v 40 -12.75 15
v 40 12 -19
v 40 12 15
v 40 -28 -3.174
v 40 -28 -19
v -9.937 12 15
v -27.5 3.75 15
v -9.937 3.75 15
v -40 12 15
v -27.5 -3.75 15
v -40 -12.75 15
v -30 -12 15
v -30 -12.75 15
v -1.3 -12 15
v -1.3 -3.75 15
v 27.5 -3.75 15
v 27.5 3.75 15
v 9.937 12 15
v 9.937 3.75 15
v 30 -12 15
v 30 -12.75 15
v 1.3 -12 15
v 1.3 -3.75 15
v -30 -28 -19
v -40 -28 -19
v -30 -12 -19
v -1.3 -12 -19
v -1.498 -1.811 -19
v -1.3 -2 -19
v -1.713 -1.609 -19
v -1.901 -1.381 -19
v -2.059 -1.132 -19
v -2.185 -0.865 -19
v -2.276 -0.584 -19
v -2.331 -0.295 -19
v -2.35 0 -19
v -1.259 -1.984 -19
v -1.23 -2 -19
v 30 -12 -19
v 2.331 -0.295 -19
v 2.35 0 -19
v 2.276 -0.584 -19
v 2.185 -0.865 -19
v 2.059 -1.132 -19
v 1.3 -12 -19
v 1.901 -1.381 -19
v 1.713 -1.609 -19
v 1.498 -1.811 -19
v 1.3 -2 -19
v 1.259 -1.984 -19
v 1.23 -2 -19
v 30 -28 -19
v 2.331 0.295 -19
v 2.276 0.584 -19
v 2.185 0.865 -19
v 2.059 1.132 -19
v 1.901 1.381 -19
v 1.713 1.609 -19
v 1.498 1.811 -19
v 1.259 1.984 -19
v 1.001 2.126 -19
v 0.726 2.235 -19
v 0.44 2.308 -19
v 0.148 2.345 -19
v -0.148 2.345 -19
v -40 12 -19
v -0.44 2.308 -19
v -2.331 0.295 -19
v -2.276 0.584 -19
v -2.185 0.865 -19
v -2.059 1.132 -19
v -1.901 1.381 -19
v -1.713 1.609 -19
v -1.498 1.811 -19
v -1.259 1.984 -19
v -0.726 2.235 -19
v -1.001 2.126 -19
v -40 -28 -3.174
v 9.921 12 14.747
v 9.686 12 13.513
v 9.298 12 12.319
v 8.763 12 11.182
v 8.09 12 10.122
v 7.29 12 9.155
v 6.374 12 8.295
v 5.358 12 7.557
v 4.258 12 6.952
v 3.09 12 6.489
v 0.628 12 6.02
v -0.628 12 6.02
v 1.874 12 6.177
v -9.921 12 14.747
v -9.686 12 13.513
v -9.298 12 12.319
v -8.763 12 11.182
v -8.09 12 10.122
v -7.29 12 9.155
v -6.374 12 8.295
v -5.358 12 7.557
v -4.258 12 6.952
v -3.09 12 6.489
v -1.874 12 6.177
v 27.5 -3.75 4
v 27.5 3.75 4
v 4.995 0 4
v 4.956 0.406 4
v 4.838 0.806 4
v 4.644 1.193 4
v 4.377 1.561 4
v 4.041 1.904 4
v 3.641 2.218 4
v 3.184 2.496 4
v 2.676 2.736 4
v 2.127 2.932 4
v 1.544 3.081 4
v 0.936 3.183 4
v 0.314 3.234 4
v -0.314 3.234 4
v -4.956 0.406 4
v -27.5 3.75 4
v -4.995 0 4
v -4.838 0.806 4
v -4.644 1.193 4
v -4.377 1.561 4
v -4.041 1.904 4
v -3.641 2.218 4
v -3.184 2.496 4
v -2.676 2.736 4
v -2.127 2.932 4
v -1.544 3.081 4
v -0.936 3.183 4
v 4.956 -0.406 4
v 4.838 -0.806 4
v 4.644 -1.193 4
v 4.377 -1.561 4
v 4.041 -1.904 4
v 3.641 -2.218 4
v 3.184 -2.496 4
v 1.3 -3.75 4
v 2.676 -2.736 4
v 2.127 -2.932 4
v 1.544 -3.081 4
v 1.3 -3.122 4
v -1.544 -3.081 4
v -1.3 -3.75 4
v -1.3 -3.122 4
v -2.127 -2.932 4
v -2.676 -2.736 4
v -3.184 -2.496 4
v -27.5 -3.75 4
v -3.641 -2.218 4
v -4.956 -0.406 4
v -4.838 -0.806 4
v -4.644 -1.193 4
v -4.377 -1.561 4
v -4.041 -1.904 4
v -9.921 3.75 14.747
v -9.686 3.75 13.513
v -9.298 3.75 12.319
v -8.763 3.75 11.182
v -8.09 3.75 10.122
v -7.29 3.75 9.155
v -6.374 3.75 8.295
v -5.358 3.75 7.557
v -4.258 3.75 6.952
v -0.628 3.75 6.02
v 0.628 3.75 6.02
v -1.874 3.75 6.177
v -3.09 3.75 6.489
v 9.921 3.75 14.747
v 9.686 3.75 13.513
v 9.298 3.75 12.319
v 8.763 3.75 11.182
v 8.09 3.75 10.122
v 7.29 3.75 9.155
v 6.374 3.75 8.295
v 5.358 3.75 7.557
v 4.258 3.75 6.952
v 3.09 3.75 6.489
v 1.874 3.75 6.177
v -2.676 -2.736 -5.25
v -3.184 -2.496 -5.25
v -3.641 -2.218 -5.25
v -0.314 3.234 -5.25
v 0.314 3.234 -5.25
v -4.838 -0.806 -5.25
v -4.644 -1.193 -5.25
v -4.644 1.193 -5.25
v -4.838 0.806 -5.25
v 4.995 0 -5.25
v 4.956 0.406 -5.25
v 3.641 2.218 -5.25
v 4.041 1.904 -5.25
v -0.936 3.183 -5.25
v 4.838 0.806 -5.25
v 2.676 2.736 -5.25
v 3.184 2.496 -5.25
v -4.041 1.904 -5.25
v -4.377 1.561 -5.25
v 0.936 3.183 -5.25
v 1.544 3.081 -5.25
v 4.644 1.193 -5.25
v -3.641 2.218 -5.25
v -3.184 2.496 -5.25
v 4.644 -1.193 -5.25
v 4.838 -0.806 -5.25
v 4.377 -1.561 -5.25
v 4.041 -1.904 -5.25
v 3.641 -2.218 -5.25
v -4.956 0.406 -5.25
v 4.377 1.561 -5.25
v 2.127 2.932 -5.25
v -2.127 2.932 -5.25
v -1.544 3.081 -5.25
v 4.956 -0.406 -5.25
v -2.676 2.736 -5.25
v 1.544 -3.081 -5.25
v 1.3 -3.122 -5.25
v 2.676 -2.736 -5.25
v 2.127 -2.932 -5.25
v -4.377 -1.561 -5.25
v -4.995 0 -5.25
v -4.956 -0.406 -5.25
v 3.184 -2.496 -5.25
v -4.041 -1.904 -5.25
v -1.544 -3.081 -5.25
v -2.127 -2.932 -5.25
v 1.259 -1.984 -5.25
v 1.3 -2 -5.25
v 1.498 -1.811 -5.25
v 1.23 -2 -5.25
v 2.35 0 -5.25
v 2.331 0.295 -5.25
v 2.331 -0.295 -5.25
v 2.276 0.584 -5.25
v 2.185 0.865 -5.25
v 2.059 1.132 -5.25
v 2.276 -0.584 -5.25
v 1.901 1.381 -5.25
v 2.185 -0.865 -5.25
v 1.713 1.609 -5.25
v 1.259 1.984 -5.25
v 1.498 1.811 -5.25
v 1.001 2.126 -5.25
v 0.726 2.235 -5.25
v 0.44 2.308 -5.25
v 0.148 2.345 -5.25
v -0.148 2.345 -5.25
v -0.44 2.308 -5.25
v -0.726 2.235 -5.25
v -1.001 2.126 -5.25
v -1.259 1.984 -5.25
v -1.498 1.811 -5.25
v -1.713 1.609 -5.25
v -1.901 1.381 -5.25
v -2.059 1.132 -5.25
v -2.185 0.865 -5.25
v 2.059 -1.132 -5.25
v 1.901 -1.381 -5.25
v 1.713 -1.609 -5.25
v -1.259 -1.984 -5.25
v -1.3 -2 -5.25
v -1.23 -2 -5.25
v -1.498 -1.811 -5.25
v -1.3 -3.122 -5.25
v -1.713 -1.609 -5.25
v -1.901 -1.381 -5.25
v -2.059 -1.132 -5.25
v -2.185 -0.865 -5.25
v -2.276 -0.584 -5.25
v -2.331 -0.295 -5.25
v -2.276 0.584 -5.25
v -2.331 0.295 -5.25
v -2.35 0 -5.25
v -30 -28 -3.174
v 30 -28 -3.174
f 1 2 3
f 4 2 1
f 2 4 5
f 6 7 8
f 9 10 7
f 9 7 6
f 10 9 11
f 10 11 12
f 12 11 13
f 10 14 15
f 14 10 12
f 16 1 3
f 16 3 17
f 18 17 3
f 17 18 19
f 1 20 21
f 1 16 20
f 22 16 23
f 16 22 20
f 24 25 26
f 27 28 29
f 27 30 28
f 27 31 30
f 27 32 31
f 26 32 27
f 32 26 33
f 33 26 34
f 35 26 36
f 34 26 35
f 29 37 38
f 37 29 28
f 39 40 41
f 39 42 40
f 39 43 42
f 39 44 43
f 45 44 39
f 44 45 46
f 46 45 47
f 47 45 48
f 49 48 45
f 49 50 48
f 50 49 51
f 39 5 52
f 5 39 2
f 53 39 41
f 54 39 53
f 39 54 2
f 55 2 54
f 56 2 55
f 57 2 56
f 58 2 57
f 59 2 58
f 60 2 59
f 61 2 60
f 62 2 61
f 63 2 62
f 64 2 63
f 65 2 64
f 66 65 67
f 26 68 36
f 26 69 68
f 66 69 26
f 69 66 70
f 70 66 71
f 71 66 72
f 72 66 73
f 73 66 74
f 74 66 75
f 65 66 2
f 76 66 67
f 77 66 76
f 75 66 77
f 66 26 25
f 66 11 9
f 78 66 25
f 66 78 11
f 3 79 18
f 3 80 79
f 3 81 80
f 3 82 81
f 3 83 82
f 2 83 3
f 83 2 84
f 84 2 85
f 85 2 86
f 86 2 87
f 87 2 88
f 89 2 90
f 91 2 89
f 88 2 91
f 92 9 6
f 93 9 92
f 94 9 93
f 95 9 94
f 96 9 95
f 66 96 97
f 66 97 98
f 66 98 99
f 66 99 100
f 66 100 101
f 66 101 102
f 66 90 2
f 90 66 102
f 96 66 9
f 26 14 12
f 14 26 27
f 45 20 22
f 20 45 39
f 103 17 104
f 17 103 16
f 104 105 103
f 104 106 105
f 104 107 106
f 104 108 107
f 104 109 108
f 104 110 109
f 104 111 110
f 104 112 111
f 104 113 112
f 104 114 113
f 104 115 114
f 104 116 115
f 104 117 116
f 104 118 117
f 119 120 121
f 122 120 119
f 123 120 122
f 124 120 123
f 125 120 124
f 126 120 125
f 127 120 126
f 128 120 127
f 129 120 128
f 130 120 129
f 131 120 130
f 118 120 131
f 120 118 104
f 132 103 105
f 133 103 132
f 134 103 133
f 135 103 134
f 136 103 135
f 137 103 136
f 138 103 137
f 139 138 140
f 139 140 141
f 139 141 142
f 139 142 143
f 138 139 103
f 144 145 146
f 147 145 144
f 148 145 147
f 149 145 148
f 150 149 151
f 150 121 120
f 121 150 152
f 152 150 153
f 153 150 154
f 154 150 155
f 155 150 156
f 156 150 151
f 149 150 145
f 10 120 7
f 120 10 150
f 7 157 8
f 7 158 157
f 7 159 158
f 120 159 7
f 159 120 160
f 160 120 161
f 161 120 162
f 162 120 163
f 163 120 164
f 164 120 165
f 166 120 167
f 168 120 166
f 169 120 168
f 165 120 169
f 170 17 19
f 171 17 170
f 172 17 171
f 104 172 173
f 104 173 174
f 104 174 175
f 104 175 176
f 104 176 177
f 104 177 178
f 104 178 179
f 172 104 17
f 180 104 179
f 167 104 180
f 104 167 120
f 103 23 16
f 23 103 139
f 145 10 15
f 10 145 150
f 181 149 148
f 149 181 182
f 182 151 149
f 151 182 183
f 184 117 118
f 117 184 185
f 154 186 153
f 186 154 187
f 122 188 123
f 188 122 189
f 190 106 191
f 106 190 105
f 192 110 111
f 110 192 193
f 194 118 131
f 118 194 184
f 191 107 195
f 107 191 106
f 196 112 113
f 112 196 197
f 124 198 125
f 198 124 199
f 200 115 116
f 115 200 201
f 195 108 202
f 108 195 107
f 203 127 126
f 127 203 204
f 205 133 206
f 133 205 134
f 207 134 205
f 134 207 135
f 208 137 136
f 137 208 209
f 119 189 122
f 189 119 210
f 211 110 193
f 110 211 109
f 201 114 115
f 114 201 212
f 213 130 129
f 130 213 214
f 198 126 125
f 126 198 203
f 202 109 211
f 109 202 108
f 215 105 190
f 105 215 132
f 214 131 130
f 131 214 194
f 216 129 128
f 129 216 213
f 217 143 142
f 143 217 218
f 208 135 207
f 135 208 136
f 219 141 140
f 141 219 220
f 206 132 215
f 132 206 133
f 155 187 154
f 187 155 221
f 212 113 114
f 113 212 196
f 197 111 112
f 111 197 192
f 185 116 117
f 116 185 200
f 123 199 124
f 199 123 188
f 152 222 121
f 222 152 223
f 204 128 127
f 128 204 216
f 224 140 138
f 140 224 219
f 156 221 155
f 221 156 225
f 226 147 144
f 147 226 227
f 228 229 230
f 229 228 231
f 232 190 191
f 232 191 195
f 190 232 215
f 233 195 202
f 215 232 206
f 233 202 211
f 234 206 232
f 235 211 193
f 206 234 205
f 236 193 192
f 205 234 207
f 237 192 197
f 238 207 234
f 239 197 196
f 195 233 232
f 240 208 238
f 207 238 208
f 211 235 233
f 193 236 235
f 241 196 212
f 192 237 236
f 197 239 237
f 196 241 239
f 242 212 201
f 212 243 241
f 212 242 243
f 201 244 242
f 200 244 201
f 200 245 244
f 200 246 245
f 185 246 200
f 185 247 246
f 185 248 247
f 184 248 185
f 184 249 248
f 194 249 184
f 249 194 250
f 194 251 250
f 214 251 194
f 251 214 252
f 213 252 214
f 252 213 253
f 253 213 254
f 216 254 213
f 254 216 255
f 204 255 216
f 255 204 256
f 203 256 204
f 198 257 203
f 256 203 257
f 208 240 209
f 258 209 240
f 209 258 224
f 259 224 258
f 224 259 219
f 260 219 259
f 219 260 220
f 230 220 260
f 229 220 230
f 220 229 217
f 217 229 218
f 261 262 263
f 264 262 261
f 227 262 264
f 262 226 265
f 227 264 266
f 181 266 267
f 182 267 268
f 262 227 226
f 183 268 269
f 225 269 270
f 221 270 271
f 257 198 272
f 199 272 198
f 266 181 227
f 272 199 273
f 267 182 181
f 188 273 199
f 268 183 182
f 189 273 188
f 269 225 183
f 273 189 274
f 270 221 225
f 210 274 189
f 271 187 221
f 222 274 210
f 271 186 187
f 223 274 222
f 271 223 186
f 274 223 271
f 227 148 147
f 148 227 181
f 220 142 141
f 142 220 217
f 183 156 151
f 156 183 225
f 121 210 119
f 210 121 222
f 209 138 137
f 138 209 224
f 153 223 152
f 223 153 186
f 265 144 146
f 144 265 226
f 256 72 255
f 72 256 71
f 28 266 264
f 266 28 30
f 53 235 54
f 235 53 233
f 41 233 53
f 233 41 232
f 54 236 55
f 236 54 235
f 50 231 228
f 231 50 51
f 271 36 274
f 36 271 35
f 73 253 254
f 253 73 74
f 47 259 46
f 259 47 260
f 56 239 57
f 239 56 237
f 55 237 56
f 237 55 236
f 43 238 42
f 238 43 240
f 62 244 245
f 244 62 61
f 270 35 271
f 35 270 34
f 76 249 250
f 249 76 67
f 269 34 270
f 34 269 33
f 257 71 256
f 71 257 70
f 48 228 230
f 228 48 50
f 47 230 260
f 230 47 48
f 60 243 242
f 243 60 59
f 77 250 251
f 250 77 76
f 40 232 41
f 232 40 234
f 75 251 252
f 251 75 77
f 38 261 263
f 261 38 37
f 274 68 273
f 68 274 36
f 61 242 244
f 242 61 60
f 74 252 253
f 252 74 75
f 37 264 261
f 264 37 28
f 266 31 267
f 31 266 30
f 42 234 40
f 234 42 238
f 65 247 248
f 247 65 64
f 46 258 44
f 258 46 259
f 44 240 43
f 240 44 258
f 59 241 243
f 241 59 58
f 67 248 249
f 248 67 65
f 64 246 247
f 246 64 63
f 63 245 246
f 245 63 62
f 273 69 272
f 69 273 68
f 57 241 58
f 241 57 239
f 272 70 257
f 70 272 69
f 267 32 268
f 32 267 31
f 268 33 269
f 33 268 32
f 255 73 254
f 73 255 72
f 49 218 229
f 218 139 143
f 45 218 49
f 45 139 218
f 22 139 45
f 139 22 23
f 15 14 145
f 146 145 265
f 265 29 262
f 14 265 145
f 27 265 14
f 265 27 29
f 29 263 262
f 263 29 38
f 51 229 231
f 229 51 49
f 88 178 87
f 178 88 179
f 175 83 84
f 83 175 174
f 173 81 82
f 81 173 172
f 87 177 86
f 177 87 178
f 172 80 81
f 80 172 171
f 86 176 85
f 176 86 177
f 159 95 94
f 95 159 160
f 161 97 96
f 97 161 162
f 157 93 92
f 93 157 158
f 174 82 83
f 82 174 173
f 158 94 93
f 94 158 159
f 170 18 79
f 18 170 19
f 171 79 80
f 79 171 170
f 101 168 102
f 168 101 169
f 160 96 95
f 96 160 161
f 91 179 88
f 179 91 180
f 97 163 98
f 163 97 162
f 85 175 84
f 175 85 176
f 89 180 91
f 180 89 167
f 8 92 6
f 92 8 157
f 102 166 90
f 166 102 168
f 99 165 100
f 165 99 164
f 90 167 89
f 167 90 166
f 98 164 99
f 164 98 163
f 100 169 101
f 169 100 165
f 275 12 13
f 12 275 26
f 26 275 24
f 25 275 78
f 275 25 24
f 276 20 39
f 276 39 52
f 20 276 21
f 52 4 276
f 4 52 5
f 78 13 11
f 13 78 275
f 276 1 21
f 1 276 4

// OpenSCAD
difference(){
	translate([0,0,-2]) cube(size = [80,24,34], center = true);
	translate([0,0,20]) color("green") cube(size = [55,7.5,32], center = true);
	scale([1.85,1.2,1])  cylinder(h = 10.5, r=2.7,$fn=50, center=true);	
	translate([0,0,-6]) cylinder(h = 26, r=2.35,$fn=50, center=true);	
	translate([0,-7.5,-2]) color("blue") cube(size = [2.6,11,35], center=true);
	translate([0,8,16]) rotate([90,0,0]) cylinder(h = 8.6, r=10,$fn=50, center=true);	

}

difference(){
	union(){
		translate([-35,-20,-2]) cube(size = [10,16,34], center = true);	
		translate([35,-20,-2]) cube(size = [10,16,34], center = true);
	}
	translate([0,-30,10]) rotate([50,0,0]) cube(size = [81,45,20], center = true);
}
